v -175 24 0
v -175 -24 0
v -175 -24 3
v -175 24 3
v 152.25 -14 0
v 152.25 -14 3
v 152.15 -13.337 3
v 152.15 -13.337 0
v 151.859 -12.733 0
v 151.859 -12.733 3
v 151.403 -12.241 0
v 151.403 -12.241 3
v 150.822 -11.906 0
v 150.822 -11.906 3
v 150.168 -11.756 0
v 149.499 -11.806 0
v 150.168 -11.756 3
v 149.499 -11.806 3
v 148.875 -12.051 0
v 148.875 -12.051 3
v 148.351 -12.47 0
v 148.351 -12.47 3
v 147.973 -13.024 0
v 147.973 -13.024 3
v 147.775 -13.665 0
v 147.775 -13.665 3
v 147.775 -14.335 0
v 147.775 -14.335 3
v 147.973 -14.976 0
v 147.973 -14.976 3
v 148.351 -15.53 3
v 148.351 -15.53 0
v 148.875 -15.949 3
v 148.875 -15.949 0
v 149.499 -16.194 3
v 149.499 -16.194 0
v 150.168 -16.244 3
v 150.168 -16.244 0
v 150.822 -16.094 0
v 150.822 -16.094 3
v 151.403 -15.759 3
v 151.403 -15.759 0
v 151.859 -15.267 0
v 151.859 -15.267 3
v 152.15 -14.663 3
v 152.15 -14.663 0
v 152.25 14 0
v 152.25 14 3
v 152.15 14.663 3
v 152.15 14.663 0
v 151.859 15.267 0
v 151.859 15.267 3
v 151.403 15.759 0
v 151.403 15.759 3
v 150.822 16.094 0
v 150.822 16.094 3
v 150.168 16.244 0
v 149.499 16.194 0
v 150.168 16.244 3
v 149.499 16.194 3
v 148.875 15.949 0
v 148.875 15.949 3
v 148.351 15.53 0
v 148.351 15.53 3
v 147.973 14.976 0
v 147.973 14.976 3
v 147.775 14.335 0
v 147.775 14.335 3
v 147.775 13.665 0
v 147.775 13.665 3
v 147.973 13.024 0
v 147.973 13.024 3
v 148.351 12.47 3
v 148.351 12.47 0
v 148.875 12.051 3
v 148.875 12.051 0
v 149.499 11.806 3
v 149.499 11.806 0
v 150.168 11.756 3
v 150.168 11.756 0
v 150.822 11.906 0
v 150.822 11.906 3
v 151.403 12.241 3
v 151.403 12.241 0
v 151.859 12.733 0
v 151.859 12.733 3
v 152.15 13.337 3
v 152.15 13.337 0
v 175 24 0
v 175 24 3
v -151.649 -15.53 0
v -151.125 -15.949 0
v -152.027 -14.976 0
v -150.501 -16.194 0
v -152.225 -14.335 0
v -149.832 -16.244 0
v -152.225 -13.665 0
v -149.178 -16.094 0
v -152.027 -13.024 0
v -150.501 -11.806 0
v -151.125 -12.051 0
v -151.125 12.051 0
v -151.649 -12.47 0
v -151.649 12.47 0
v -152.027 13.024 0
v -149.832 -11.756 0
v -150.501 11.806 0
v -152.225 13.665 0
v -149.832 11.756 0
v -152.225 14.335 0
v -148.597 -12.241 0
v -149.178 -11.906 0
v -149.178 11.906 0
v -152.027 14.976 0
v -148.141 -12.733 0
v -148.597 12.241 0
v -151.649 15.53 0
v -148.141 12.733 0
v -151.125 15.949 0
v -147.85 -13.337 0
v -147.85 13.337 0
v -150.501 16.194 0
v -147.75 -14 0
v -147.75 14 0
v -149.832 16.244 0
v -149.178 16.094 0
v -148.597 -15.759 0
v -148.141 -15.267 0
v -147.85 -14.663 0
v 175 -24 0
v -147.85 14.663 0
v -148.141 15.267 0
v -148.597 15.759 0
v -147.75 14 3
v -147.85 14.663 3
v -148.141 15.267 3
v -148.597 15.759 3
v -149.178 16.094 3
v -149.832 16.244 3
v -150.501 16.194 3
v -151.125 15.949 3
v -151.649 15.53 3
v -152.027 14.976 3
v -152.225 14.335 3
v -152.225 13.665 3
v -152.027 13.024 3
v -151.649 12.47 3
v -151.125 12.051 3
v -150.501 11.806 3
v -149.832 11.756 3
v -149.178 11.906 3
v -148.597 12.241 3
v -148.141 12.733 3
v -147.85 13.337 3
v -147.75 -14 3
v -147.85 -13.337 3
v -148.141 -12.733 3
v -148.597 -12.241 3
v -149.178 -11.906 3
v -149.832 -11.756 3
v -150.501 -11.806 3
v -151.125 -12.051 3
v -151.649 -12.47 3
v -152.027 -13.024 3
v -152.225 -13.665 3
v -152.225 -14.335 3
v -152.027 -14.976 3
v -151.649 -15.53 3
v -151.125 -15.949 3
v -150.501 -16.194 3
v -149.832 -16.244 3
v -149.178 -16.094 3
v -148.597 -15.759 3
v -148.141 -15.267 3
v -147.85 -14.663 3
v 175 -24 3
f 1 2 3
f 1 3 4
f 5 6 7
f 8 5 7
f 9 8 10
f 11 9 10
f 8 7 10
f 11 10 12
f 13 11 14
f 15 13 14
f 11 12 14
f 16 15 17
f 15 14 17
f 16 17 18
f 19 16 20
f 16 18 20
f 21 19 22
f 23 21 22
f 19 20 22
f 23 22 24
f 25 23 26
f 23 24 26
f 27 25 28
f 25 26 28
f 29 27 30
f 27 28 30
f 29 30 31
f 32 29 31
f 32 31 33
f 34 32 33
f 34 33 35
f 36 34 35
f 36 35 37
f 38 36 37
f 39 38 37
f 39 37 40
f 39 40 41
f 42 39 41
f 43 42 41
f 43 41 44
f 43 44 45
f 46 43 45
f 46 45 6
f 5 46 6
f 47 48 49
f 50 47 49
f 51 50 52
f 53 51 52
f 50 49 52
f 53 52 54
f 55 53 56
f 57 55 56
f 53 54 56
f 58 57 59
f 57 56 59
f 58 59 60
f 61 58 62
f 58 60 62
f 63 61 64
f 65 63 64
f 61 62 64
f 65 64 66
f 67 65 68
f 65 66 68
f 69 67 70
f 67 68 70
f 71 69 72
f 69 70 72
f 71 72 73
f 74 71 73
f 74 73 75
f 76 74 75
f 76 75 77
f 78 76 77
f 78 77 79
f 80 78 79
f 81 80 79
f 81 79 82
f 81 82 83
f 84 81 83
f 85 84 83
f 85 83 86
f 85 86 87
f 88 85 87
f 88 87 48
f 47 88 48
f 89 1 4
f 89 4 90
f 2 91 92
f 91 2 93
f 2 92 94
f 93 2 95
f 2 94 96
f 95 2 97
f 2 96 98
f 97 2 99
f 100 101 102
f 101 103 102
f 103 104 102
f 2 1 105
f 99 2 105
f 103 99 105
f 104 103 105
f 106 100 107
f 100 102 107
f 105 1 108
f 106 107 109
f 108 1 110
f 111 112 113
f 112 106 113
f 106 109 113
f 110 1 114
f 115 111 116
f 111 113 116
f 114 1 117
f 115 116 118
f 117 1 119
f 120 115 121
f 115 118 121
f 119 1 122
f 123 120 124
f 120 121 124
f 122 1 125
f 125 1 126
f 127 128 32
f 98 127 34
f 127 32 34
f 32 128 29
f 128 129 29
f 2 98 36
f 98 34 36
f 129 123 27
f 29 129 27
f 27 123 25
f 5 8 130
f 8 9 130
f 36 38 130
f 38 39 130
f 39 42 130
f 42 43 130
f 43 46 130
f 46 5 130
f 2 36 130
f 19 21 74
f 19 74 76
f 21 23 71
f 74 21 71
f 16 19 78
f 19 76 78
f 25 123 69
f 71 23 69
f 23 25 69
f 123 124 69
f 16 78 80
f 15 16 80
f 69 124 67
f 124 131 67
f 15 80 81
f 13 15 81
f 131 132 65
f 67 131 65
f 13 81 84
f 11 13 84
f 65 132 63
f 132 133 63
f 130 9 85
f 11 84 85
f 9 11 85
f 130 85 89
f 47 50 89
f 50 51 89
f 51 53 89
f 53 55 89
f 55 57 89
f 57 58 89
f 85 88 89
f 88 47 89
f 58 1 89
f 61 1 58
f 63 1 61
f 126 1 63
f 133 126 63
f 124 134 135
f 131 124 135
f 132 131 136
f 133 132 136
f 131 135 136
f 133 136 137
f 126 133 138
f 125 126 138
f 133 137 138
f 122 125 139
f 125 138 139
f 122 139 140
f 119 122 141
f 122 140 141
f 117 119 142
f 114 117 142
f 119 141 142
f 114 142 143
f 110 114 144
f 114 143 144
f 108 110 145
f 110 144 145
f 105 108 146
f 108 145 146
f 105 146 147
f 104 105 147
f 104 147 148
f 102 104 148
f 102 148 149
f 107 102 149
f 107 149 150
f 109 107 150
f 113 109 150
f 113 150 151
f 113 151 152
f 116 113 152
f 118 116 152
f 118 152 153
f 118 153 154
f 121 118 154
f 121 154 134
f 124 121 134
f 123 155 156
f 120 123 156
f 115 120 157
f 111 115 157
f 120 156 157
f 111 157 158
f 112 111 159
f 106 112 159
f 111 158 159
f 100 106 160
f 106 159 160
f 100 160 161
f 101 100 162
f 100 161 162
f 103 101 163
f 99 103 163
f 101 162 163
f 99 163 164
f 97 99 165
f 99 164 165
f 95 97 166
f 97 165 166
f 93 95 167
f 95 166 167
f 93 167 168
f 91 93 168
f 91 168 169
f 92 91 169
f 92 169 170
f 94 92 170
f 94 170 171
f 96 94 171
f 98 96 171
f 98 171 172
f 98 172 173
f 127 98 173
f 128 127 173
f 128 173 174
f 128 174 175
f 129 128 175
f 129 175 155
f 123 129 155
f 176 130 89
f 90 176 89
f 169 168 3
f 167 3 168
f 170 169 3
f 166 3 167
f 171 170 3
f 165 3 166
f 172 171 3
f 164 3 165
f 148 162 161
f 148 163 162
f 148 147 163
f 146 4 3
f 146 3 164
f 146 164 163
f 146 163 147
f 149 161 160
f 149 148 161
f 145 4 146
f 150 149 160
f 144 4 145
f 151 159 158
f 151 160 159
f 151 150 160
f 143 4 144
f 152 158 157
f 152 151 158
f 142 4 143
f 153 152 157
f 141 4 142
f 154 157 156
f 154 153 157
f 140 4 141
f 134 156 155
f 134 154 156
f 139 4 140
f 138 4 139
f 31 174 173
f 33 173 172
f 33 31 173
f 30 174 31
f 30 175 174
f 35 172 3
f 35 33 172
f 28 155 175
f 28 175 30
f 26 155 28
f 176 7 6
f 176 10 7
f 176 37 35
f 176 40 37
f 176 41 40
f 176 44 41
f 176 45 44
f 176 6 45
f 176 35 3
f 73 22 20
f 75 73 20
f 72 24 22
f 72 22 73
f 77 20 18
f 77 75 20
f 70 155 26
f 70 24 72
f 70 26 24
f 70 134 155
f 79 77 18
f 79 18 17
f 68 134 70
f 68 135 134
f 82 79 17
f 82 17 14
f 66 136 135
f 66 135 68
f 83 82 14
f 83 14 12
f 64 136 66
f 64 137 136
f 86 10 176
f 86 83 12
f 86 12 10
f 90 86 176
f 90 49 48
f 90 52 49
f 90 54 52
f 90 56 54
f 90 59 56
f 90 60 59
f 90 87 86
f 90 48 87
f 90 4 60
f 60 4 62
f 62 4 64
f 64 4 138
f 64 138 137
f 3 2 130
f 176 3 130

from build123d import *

# Parameters (mm, degrees)
ESQUISSE1_W             = 350
ESQUISSE1_H             = 48
BOSS_EXTRU_1_DEPTH      = 3
ENL_V_MAT_EXTRU_1_REACH = 178.664
ESQUISSE2_R             = 2.25


with BuildPart() as part:
    # Esquisse1 → Boss.-Extru.1 (new body)
    with BuildSketch(Plane.XY):
        Rectangle(ESQUISSE1_W, ESQUISSE1_H)
    extrude(amount=BOSS_EXTRU_1_DEPTH)

    # Esquisse2 → Enlèv. mat.-Extru.1 (cut, up to next)
    with BuildSketch(Plane.XY.offset(3), mode=Mode.PRIVATE) as enl_v_mat_extru_1_sk1:
        with Locations((-150, 14)):
            Circle(ESQUISSE2_R)
    enl_v_mat_extru_1_tool1 = extrude(enl_v_mat_extru_1_sk1.sketch, amount=-ENL_V_MAT_EXTRU_1_REACH, mode=Mode.PRIVATE) & part.part
    # Esquisse2 → Enlèv. mat.-Extru.1 (cut, up to next)
    with BuildSketch(Plane.XY.offset(3), mode=Mode.PRIVATE) as enl_v_mat_extru_1_sk2:
        with Locations((-150, -14)):
            Circle(ESQUISSE2_R)
    enl_v_mat_extru_1_tool2 = extrude(enl_v_mat_extru_1_sk2.sketch, amount=-ENL_V_MAT_EXTRU_1_REACH, mode=Mode.PRIVATE) & part.part
    # Esquisse2 → Enlèv. mat.-Extru.1 (cut, up to next)
    with BuildSketch(Plane.XY.offset(3), mode=Mode.PRIVATE) as enl_v_mat_extru_1_sk3:
        with Locations((150, 14)):
            Circle(ESQUISSE2_R)
    enl_v_mat_extru_1_tool3 = extrude(enl_v_mat_extru_1_sk3.sketch, amount=-ENL_V_MAT_EXTRU_1_REACH, mode=Mode.PRIVATE) & part.part
    # Esquisse2 → Enlèv. mat.-Extru.1 (cut, up to next)
    with BuildSketch(Plane.XY.offset(3), mode=Mode.PRIVATE) as enl_v_mat_extru_1_sk4:
        with Locations((150, -14)):
            Circle(ESQUISSE2_R)
    enl_v_mat_extru_1_tool4 = extrude(enl_v_mat_extru_1_sk4.sketch, amount=-ENL_V_MAT_EXTRU_1_REACH, mode=Mode.PRIVATE) & part.part
    add(enl_v_mat_extru_1_tool1.solids().sort_by_distance((-150, 14, 3))[0], mode=Mode.SUBTRACT)
    add(enl_v_mat_extru_1_tool2.solids().sort_by_distance((-150, -14, 3))[0], mode=Mode.SUBTRACT)
    add(enl_v_mat_extru_1_tool3.solids().sort_by_distance((150, 14, 3))[0], mode=Mode.SUBTRACT)
    add(enl_v_mat_extru_1_tool4.solids().sort_by_distance((150, -14, 3))[0], mode=Mode.SUBTRACT)


solid = part.part
